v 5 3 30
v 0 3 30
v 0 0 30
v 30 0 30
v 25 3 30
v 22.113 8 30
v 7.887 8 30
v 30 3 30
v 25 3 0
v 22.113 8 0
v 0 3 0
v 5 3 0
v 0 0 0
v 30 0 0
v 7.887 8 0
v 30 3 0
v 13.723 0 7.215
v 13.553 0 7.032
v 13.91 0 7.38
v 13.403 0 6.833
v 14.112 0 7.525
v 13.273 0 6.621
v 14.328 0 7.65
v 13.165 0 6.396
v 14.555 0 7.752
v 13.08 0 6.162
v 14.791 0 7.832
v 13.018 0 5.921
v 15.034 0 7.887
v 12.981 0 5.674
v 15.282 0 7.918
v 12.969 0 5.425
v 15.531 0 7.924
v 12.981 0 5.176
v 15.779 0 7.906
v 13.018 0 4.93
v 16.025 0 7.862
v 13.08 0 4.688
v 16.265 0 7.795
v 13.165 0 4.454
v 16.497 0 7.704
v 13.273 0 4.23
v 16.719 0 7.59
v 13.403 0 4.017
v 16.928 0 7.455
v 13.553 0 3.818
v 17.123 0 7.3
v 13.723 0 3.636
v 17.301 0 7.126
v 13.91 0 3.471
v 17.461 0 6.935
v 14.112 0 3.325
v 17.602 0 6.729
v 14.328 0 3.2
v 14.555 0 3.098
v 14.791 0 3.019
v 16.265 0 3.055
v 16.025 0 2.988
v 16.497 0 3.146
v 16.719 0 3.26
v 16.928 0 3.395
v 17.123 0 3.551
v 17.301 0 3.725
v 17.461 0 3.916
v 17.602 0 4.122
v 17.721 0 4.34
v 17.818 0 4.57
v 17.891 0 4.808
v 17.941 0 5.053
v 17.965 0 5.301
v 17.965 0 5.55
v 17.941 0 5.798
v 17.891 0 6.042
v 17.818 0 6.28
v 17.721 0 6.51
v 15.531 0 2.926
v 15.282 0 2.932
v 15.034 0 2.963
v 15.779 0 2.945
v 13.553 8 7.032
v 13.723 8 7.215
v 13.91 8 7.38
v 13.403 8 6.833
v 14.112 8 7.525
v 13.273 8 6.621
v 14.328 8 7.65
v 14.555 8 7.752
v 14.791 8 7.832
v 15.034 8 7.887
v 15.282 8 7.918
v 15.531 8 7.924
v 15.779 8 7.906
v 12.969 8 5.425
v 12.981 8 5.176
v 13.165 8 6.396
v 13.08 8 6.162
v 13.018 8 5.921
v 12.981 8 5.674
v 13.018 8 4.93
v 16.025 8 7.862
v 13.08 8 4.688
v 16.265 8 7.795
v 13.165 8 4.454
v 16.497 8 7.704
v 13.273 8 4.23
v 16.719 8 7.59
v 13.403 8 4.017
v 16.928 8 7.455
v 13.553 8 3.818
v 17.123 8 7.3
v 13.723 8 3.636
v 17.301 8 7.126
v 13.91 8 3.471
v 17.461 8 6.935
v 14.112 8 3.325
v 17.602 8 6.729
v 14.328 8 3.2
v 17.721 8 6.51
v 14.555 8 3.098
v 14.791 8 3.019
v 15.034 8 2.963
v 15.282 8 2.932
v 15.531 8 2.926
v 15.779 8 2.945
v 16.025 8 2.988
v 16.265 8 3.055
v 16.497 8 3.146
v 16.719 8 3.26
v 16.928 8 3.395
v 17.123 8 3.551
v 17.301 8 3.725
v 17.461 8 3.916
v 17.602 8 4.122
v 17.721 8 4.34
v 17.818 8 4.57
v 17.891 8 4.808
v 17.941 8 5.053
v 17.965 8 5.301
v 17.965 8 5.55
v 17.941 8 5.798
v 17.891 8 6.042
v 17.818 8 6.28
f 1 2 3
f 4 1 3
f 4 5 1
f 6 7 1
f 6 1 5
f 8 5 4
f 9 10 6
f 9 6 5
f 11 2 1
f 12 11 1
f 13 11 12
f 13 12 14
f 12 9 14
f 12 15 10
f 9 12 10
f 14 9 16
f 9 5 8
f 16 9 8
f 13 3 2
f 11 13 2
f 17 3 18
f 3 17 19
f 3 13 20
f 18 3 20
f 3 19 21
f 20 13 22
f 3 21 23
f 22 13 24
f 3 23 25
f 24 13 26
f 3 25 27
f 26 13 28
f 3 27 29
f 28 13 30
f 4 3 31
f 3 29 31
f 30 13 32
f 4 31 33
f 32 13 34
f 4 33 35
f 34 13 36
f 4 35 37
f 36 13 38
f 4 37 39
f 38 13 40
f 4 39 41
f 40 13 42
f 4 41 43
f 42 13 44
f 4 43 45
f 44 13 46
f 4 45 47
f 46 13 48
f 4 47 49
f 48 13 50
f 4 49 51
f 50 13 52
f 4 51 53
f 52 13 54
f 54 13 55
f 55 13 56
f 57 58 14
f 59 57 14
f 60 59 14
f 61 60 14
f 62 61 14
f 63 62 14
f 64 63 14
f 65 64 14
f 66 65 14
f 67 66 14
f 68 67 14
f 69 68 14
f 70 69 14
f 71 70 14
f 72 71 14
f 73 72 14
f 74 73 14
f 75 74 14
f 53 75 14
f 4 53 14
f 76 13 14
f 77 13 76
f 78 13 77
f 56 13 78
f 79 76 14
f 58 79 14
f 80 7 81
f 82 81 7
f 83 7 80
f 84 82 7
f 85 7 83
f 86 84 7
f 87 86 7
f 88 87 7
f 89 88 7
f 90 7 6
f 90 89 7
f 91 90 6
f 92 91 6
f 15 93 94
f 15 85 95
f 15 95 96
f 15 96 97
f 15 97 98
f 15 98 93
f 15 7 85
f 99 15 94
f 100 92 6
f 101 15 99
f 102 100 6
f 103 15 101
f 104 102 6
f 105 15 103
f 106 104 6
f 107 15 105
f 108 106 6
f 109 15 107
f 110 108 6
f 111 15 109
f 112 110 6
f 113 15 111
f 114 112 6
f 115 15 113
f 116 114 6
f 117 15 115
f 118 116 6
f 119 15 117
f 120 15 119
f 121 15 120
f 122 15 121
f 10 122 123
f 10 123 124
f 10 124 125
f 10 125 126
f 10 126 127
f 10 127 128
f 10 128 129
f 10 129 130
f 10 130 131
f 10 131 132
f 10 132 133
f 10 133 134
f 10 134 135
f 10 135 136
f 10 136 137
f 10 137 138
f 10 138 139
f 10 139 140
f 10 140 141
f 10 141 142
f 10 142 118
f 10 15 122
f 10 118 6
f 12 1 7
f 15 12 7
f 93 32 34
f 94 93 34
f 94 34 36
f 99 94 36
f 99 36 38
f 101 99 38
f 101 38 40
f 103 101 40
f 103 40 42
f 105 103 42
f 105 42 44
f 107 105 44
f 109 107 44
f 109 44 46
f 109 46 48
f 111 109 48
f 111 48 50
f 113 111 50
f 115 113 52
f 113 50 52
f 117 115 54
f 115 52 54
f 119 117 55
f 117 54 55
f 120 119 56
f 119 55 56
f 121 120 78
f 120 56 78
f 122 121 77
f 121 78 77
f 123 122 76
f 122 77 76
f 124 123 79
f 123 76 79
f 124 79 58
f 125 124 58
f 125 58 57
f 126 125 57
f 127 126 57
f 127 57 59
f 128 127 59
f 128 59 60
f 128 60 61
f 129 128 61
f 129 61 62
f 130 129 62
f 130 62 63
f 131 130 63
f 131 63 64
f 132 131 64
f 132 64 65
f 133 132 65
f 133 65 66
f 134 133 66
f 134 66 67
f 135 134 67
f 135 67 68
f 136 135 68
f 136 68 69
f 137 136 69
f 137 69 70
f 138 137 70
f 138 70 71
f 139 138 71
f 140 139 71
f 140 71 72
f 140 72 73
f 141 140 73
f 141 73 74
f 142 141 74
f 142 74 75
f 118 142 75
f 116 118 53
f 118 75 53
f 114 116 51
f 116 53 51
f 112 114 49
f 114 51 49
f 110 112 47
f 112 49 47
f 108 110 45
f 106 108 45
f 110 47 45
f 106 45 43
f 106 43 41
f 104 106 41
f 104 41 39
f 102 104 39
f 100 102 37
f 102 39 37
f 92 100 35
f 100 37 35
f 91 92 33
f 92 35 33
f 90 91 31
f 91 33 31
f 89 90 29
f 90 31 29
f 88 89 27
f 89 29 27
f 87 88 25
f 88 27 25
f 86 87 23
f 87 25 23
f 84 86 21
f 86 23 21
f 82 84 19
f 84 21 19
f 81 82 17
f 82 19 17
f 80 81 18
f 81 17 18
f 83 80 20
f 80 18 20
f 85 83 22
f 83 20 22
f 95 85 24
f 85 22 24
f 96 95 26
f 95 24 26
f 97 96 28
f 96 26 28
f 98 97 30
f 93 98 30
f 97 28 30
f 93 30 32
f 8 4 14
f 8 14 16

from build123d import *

# Parameters (mm, degrees)
SKETCH_1_W          = 30
SKETCH_1_H          = 8
EXTRUDE_1_DEPTH     = 30
CUT_EXTRUDE_2_DEPTH = 44.17406629
M6X1_01_D           = 5
M6X1_01_DEPTH       = 17
M6X1_01_TIP         = 1.502151548


with BuildPart() as part:
    # Эскиз1 → Бобышка-Вытянуть1 (new body)
    with BuildSketch(Plane.XY):
        with Locations((15, 4)):
            Rectangle(SKETCH_1_W, SKETCH_1_H)
    extrude(amount=EXTRUDE_1_DEPTH)

    # Эскиз3 → Вырез-Вытянуть2 (cut, through all)
    with BuildSketch(Plane.XY.offset(30)):
        Polygon((5, 3), (7.886751346, 8), (5, 8), (0, 8), (0, 3), align=None)
        Polygon((25, 3), (30, 3), (30, 8), (25, 8), (22.113248654, 8), align=None)
    extrude(amount=-CUT_EXTRUDE_2_DEPTH, mode=Mode.SUBTRACT)

    # Отверстие обработанное метчиком M6x1.01
    with Locations(Plane(origin=(0, 8, 0), x_dir=(1, 0, 0), z_dir=(0, 1, 0))):
        with Locations((15.468545431, -5.425177516)):
            Hole(M6X1_01_D / 2, depth=M6X1_01_DEPTH)
            with Locations((0, 0, -(M6X1_01_DEPTH + M6X1_01_TIP / 2))):  # 118° drill point
                Cone(0, M6X1_01_D / 2, M6X1_01_TIP, mode=Mode.SUBTRACT)


solid = part.part
